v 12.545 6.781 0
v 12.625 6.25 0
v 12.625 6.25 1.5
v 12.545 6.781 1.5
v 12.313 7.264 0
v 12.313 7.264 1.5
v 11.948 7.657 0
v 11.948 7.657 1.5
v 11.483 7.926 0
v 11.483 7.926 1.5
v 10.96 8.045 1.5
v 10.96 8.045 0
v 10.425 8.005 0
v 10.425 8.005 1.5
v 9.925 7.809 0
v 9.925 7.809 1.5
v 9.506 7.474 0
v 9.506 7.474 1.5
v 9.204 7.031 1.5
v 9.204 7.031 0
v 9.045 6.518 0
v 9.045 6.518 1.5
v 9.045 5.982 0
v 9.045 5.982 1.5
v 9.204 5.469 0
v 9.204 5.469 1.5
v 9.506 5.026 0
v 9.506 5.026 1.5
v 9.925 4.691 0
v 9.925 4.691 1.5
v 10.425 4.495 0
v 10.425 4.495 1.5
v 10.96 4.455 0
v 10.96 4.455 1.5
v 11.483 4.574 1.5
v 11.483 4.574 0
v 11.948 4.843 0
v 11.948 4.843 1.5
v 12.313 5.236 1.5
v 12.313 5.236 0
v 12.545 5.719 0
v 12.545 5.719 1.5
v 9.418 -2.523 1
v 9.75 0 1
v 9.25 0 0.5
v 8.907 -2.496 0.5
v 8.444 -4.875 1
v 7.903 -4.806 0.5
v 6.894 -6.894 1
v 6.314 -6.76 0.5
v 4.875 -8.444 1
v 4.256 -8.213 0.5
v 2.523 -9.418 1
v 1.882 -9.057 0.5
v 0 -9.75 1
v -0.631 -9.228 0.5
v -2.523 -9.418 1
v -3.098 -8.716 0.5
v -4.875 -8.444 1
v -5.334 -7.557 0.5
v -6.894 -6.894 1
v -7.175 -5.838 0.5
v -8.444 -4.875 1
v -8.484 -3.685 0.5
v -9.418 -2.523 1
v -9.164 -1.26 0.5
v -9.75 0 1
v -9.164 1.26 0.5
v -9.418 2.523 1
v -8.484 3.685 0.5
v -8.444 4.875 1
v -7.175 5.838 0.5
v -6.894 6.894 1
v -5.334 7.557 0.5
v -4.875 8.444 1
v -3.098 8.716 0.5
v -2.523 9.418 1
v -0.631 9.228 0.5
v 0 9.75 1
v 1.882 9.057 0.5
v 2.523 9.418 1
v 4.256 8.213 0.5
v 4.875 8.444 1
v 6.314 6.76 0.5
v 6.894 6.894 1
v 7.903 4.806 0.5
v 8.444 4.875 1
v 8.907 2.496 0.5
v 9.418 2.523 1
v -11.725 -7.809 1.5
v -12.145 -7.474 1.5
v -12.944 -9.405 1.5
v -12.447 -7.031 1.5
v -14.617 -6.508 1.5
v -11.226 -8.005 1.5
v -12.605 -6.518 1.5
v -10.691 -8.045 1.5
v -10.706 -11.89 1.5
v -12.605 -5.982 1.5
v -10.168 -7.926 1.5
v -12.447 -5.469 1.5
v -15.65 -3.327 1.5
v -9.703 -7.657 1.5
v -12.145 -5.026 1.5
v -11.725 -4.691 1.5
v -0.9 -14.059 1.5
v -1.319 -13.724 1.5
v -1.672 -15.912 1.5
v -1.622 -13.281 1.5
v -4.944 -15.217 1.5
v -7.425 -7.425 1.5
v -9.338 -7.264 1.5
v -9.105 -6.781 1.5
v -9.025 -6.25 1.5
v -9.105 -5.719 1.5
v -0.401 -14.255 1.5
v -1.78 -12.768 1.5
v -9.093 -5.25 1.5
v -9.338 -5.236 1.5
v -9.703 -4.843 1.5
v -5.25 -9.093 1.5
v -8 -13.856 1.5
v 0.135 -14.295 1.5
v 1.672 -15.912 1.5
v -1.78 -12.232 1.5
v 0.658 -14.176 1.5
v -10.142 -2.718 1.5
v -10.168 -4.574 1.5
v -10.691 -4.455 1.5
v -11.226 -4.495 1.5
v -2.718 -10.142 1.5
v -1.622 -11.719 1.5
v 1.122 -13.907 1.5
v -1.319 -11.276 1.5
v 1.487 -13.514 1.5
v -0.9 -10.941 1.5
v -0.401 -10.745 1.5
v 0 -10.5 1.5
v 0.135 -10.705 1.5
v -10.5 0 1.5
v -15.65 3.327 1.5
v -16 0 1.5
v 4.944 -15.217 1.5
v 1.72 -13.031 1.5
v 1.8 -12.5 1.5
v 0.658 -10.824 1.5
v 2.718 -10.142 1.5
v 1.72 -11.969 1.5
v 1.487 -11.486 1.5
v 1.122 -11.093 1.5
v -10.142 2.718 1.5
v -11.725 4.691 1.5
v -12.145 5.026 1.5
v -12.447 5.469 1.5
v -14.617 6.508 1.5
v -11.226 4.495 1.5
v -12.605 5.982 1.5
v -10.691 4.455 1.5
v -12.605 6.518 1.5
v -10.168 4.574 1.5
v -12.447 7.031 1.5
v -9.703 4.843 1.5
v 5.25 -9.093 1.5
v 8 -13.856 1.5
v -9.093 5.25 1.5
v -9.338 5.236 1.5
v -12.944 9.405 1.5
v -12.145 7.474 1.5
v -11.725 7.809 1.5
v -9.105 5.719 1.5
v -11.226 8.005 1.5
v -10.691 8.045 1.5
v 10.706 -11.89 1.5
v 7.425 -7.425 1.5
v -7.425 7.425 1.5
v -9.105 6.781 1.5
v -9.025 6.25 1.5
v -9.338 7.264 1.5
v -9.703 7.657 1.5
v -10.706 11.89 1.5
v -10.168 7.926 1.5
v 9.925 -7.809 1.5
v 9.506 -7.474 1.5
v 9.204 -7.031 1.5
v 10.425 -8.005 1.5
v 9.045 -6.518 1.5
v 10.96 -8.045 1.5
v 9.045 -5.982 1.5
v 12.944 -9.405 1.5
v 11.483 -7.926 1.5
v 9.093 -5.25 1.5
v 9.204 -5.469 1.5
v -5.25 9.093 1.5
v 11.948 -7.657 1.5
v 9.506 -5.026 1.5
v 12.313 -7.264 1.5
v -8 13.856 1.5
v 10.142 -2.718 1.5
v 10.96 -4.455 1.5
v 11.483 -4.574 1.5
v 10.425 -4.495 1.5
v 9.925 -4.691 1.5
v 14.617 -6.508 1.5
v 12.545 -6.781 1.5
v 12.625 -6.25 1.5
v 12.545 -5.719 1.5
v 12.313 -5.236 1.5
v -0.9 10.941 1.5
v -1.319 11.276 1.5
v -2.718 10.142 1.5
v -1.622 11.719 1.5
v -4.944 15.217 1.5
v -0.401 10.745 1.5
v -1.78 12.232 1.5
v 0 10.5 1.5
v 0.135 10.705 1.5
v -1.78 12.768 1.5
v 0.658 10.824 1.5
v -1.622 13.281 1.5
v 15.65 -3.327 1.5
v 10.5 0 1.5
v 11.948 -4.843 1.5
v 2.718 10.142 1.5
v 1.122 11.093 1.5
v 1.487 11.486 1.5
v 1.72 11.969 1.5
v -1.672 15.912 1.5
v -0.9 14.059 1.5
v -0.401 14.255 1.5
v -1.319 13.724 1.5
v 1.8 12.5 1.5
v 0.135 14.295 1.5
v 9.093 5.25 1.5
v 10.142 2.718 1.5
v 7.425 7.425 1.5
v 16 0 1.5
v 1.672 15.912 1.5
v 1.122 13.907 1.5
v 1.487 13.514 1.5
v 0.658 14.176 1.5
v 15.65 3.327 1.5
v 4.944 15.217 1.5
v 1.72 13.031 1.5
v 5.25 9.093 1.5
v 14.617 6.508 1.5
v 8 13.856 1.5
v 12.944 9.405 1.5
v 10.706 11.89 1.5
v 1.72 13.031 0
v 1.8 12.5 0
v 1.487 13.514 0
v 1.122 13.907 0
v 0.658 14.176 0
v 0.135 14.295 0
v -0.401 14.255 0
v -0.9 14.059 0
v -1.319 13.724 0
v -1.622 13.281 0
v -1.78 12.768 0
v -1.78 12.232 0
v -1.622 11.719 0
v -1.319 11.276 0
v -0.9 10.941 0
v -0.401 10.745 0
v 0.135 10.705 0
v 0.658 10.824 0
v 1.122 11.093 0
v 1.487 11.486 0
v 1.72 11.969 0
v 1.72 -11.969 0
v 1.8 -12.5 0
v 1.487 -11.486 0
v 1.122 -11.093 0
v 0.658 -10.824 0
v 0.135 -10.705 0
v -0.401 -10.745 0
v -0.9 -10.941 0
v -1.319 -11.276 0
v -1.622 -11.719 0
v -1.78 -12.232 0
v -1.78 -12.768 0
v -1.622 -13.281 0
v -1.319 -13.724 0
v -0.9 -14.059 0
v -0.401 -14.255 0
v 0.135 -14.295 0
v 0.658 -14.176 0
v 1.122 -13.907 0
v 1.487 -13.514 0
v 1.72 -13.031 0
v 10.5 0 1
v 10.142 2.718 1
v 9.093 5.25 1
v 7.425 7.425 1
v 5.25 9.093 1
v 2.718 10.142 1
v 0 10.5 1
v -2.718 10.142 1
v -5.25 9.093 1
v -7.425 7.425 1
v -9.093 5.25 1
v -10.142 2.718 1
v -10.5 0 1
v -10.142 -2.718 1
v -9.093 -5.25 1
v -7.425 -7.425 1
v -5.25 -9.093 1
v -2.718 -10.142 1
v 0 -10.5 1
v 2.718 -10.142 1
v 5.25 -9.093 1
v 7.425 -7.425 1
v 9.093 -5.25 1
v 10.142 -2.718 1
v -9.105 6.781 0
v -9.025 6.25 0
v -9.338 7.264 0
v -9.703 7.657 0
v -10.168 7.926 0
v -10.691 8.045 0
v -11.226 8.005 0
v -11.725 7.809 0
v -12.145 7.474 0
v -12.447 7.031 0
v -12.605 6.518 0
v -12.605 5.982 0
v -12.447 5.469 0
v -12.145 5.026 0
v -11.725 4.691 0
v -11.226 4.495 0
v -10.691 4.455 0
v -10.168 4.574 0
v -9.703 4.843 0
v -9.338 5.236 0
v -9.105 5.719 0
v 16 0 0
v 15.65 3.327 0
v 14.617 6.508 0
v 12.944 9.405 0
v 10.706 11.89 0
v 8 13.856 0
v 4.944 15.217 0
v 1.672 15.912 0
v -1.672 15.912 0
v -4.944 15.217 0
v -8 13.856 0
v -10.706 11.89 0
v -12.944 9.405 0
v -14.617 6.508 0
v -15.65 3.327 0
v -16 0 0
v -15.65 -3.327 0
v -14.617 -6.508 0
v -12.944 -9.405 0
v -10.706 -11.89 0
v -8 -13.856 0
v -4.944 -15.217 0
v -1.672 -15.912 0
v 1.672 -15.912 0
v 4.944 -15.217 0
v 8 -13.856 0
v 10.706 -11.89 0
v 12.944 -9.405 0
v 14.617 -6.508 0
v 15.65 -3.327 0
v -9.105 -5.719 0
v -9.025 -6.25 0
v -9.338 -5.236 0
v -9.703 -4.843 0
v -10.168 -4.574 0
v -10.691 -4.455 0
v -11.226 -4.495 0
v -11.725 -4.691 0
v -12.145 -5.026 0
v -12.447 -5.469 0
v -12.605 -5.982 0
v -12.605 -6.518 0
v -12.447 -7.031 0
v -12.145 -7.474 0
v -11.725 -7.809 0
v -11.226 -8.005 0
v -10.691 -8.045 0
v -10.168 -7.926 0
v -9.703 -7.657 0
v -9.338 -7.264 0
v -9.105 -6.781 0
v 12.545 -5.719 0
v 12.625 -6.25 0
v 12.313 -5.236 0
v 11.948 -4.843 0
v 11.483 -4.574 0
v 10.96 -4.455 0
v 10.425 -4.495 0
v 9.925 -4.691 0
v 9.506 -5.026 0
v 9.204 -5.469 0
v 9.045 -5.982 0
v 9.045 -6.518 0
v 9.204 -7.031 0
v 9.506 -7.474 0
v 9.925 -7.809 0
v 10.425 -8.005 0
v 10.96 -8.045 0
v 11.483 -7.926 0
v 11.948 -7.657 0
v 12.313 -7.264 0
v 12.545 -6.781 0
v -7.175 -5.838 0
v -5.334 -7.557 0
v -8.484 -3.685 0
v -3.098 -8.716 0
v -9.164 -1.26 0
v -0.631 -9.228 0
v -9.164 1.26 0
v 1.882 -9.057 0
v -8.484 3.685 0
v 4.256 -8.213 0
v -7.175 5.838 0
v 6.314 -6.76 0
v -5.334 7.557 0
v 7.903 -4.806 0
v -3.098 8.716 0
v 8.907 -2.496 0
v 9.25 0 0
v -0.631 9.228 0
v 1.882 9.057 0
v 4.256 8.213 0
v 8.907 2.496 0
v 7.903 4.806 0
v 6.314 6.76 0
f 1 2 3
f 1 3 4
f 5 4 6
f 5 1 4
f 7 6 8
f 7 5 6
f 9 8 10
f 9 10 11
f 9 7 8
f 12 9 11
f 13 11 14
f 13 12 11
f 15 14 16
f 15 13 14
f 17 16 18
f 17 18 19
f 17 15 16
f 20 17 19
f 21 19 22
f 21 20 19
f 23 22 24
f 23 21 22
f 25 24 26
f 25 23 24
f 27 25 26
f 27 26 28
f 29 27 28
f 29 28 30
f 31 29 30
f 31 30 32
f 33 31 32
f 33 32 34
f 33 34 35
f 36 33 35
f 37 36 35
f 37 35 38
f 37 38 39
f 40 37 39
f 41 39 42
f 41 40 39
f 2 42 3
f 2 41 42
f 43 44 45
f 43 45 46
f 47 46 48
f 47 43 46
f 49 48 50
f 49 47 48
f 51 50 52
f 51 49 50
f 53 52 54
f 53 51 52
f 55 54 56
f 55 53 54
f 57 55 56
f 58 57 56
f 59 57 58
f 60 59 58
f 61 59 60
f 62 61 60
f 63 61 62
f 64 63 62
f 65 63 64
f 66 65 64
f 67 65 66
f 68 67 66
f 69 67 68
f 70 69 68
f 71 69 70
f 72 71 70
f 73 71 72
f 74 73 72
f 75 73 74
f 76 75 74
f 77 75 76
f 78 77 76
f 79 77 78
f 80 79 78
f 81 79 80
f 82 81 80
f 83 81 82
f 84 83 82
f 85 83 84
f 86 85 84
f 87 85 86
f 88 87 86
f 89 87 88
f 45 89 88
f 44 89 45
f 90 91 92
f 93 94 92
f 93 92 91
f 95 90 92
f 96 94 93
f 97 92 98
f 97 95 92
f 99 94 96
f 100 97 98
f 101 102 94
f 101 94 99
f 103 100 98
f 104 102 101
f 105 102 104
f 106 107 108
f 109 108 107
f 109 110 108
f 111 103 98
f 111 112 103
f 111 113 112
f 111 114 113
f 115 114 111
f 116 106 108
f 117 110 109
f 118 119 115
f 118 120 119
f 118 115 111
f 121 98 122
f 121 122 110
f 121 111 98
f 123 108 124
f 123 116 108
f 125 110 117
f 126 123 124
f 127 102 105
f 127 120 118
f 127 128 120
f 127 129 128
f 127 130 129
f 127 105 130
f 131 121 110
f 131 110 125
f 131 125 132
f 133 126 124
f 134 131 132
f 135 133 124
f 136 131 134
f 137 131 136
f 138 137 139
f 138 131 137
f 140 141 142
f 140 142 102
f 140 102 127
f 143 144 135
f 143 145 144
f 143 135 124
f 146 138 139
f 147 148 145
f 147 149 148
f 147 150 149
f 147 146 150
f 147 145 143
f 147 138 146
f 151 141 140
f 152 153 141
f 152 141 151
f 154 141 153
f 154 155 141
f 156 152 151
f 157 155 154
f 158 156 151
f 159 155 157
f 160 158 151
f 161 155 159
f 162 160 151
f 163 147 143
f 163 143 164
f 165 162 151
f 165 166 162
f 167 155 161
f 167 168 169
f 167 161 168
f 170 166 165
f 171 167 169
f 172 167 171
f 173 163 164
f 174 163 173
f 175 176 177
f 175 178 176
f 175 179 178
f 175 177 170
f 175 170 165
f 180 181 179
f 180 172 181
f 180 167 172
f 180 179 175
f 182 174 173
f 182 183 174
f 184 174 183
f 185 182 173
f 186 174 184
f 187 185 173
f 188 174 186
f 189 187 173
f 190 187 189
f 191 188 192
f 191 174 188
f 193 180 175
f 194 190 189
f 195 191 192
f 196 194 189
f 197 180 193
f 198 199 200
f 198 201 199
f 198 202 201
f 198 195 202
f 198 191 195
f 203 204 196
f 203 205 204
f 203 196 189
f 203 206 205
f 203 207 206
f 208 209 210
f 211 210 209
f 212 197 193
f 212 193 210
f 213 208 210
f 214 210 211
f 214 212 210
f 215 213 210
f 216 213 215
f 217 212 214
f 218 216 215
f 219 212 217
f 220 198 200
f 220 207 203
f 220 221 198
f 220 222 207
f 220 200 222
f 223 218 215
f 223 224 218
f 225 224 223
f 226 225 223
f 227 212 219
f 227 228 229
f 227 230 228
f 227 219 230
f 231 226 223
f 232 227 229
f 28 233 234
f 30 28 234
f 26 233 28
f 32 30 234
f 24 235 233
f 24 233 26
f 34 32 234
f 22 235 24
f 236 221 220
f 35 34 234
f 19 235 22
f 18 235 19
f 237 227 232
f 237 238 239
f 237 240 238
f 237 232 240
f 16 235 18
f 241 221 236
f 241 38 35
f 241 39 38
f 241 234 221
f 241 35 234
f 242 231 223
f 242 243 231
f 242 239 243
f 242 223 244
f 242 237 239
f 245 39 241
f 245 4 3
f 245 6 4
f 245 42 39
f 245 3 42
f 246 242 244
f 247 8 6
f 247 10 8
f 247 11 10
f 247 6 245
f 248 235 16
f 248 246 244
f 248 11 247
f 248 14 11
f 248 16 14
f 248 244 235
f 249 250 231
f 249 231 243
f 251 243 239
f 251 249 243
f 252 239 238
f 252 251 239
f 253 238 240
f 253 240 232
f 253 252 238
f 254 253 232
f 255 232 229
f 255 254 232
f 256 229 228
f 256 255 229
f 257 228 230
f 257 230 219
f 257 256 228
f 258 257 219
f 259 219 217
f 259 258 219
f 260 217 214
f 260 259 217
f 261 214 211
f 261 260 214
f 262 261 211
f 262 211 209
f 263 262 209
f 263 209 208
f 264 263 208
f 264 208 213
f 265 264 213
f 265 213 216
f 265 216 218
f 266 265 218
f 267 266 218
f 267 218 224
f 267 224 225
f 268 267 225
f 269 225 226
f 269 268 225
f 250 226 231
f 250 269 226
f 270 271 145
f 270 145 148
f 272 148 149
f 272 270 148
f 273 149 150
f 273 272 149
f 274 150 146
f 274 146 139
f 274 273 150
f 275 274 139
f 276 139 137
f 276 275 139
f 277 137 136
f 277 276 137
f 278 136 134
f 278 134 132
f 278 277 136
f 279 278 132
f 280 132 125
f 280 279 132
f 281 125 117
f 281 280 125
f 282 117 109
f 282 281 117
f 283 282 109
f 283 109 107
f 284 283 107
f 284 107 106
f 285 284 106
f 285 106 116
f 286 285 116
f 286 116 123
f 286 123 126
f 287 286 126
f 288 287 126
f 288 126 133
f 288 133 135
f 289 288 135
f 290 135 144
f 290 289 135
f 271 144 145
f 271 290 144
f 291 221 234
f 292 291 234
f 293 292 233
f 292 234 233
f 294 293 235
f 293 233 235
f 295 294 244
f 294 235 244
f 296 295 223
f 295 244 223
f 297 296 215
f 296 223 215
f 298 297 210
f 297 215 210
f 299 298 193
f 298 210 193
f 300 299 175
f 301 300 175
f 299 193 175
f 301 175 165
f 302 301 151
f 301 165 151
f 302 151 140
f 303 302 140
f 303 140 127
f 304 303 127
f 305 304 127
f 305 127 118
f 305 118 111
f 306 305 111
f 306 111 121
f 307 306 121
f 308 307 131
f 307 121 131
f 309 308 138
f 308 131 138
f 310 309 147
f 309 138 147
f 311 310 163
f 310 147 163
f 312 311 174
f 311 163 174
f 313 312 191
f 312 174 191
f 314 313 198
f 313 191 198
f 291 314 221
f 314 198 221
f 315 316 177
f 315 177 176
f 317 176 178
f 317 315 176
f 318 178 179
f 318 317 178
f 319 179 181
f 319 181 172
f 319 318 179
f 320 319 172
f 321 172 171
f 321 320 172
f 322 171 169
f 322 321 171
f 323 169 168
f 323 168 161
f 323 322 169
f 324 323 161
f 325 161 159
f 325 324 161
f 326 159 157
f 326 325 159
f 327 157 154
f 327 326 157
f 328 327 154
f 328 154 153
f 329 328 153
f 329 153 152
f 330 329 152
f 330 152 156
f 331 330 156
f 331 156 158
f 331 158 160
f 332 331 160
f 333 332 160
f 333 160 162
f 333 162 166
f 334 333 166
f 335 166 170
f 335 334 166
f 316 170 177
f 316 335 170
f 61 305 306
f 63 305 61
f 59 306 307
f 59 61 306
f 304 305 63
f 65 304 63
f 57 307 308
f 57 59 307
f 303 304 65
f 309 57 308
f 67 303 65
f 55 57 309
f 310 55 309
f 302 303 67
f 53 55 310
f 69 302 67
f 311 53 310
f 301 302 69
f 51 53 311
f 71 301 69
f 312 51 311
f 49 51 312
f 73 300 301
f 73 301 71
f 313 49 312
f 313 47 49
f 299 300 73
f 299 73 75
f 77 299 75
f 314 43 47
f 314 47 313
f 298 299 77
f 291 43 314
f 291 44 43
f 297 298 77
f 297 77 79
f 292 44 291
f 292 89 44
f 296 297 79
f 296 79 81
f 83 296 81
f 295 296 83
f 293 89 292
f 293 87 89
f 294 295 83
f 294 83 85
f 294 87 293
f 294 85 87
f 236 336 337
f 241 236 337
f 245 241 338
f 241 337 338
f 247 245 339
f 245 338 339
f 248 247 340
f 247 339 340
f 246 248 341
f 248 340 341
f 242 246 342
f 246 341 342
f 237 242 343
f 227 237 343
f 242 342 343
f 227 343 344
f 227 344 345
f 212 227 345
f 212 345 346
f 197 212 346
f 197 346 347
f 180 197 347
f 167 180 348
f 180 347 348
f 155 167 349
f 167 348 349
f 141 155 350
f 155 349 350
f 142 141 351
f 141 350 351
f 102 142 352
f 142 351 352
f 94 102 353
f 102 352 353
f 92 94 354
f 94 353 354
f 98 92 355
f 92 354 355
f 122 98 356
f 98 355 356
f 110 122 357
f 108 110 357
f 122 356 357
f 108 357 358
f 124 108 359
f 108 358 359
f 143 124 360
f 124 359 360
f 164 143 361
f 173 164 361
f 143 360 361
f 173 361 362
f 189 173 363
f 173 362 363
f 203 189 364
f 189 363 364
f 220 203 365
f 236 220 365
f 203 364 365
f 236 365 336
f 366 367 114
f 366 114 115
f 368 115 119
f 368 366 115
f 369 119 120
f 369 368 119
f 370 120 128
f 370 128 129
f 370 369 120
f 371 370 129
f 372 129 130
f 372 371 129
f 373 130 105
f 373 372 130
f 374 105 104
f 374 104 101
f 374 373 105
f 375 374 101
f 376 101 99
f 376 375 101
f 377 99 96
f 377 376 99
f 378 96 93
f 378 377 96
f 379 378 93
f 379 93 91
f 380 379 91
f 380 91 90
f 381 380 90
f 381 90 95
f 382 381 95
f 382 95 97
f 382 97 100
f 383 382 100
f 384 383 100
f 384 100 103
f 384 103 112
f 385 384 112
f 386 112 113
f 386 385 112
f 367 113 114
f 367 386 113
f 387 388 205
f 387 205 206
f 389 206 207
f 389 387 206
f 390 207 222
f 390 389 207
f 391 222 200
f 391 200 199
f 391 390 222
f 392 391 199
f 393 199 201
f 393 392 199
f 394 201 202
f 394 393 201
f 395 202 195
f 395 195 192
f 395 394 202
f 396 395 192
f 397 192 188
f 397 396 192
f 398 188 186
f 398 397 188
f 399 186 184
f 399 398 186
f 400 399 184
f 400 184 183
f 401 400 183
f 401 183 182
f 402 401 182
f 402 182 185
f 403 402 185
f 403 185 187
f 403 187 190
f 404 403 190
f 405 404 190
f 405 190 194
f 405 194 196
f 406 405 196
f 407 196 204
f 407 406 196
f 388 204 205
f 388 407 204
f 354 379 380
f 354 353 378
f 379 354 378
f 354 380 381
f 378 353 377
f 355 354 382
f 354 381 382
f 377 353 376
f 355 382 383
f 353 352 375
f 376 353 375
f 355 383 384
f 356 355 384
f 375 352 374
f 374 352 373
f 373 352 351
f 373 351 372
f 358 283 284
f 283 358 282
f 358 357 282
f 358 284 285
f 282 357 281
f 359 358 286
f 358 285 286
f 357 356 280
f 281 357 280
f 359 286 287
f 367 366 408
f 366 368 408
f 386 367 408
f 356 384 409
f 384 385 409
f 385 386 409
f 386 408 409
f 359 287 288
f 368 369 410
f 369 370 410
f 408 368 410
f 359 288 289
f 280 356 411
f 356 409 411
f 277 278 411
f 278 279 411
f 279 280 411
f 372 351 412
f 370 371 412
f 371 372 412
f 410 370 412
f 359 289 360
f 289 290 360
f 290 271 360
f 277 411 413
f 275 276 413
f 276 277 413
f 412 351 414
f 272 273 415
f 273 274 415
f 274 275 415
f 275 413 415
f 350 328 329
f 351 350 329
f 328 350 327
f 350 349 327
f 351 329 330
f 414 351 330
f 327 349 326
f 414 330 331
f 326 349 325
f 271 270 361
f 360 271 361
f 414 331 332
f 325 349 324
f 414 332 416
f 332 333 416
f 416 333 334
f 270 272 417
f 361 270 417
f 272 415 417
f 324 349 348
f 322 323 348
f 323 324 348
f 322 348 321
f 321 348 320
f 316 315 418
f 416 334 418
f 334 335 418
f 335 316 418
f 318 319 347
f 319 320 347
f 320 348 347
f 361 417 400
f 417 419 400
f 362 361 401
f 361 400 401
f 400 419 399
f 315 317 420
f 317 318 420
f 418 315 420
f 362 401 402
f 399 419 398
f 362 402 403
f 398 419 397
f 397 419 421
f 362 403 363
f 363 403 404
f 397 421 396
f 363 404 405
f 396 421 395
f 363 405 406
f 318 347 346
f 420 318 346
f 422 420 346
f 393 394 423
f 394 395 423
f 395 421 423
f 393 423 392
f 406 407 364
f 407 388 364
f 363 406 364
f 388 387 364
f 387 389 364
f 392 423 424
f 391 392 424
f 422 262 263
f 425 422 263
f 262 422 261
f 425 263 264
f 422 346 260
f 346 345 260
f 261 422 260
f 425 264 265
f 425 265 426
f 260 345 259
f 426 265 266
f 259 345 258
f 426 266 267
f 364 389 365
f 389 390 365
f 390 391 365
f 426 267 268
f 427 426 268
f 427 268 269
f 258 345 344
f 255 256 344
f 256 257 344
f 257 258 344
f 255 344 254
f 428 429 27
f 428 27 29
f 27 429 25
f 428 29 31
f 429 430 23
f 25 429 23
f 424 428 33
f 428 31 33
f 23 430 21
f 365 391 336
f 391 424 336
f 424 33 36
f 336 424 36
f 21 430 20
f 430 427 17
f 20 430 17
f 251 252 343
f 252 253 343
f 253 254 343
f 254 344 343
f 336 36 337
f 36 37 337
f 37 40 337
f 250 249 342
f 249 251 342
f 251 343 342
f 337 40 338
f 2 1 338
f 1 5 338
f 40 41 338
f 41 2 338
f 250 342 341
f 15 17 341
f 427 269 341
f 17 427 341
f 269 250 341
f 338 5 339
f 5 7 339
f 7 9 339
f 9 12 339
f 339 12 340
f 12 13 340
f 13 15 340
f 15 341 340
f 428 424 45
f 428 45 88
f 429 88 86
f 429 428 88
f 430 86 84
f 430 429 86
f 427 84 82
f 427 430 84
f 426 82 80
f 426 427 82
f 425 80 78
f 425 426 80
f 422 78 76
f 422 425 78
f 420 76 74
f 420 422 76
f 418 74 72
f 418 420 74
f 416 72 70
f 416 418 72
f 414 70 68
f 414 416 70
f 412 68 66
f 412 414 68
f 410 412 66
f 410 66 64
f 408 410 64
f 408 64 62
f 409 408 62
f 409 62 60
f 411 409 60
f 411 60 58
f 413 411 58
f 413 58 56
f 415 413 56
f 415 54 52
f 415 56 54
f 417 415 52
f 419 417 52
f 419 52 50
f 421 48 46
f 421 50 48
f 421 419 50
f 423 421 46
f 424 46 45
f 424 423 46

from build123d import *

# Parameters (mm, degrees)
F0_R     = 16
F0_R_2   = 1.8
F0_R_3   = 9.25
F1_DEPTH = 1.5
F2_R     = 10.5
F3_DEPTH = 0.5
F4_SIZE  = 0.5


with BuildPart() as f1:
    # F0 (on Top) → F1 (new body)
    with BuildSketch(Plane.XY):
        Circle(F0_R)
        with Locations((-10.825318, -6.25)):
            Circle(F0_R_2, mode=Mode.SUBTRACT)
        with Locations((0, -12.5)):
            Circle(F0_R_2, mode=Mode.SUBTRACT)
        with Locations((10.825318, -6.25)):
            Circle(F0_R_2, mode=Mode.SUBTRACT)
        with Locations((-10.825318, 6.25)):
            Circle(F0_R_2, mode=Mode.SUBTRACT)
        Circle(F0_R_3, mode=Mode.SUBTRACT)
        with Locations((10.825318, 6.25)):
            Circle(F0_R_2, mode=Mode.SUBTRACT)
        with Locations((0, 12.5)):
            Circle(F0_R_2, mode=Mode.SUBTRACT)
    extrude(amount=F1_DEPTH)

    # F2 (on face) → F3 (cut)
    with BuildSketch(Plane.XY.offset(1.5)):
        Circle(F2_R)
    extrude(amount=-F3_DEPTH, mode=Mode.SUBTRACT)

    # F4
    f4_edges = [f1.edges().sort_by_distance(p)[0] for p in [
        (-9.25, 0, 1),
    ]]
    chamfer(f4_edges, length=F4_SIZE)


solid = f1.part
